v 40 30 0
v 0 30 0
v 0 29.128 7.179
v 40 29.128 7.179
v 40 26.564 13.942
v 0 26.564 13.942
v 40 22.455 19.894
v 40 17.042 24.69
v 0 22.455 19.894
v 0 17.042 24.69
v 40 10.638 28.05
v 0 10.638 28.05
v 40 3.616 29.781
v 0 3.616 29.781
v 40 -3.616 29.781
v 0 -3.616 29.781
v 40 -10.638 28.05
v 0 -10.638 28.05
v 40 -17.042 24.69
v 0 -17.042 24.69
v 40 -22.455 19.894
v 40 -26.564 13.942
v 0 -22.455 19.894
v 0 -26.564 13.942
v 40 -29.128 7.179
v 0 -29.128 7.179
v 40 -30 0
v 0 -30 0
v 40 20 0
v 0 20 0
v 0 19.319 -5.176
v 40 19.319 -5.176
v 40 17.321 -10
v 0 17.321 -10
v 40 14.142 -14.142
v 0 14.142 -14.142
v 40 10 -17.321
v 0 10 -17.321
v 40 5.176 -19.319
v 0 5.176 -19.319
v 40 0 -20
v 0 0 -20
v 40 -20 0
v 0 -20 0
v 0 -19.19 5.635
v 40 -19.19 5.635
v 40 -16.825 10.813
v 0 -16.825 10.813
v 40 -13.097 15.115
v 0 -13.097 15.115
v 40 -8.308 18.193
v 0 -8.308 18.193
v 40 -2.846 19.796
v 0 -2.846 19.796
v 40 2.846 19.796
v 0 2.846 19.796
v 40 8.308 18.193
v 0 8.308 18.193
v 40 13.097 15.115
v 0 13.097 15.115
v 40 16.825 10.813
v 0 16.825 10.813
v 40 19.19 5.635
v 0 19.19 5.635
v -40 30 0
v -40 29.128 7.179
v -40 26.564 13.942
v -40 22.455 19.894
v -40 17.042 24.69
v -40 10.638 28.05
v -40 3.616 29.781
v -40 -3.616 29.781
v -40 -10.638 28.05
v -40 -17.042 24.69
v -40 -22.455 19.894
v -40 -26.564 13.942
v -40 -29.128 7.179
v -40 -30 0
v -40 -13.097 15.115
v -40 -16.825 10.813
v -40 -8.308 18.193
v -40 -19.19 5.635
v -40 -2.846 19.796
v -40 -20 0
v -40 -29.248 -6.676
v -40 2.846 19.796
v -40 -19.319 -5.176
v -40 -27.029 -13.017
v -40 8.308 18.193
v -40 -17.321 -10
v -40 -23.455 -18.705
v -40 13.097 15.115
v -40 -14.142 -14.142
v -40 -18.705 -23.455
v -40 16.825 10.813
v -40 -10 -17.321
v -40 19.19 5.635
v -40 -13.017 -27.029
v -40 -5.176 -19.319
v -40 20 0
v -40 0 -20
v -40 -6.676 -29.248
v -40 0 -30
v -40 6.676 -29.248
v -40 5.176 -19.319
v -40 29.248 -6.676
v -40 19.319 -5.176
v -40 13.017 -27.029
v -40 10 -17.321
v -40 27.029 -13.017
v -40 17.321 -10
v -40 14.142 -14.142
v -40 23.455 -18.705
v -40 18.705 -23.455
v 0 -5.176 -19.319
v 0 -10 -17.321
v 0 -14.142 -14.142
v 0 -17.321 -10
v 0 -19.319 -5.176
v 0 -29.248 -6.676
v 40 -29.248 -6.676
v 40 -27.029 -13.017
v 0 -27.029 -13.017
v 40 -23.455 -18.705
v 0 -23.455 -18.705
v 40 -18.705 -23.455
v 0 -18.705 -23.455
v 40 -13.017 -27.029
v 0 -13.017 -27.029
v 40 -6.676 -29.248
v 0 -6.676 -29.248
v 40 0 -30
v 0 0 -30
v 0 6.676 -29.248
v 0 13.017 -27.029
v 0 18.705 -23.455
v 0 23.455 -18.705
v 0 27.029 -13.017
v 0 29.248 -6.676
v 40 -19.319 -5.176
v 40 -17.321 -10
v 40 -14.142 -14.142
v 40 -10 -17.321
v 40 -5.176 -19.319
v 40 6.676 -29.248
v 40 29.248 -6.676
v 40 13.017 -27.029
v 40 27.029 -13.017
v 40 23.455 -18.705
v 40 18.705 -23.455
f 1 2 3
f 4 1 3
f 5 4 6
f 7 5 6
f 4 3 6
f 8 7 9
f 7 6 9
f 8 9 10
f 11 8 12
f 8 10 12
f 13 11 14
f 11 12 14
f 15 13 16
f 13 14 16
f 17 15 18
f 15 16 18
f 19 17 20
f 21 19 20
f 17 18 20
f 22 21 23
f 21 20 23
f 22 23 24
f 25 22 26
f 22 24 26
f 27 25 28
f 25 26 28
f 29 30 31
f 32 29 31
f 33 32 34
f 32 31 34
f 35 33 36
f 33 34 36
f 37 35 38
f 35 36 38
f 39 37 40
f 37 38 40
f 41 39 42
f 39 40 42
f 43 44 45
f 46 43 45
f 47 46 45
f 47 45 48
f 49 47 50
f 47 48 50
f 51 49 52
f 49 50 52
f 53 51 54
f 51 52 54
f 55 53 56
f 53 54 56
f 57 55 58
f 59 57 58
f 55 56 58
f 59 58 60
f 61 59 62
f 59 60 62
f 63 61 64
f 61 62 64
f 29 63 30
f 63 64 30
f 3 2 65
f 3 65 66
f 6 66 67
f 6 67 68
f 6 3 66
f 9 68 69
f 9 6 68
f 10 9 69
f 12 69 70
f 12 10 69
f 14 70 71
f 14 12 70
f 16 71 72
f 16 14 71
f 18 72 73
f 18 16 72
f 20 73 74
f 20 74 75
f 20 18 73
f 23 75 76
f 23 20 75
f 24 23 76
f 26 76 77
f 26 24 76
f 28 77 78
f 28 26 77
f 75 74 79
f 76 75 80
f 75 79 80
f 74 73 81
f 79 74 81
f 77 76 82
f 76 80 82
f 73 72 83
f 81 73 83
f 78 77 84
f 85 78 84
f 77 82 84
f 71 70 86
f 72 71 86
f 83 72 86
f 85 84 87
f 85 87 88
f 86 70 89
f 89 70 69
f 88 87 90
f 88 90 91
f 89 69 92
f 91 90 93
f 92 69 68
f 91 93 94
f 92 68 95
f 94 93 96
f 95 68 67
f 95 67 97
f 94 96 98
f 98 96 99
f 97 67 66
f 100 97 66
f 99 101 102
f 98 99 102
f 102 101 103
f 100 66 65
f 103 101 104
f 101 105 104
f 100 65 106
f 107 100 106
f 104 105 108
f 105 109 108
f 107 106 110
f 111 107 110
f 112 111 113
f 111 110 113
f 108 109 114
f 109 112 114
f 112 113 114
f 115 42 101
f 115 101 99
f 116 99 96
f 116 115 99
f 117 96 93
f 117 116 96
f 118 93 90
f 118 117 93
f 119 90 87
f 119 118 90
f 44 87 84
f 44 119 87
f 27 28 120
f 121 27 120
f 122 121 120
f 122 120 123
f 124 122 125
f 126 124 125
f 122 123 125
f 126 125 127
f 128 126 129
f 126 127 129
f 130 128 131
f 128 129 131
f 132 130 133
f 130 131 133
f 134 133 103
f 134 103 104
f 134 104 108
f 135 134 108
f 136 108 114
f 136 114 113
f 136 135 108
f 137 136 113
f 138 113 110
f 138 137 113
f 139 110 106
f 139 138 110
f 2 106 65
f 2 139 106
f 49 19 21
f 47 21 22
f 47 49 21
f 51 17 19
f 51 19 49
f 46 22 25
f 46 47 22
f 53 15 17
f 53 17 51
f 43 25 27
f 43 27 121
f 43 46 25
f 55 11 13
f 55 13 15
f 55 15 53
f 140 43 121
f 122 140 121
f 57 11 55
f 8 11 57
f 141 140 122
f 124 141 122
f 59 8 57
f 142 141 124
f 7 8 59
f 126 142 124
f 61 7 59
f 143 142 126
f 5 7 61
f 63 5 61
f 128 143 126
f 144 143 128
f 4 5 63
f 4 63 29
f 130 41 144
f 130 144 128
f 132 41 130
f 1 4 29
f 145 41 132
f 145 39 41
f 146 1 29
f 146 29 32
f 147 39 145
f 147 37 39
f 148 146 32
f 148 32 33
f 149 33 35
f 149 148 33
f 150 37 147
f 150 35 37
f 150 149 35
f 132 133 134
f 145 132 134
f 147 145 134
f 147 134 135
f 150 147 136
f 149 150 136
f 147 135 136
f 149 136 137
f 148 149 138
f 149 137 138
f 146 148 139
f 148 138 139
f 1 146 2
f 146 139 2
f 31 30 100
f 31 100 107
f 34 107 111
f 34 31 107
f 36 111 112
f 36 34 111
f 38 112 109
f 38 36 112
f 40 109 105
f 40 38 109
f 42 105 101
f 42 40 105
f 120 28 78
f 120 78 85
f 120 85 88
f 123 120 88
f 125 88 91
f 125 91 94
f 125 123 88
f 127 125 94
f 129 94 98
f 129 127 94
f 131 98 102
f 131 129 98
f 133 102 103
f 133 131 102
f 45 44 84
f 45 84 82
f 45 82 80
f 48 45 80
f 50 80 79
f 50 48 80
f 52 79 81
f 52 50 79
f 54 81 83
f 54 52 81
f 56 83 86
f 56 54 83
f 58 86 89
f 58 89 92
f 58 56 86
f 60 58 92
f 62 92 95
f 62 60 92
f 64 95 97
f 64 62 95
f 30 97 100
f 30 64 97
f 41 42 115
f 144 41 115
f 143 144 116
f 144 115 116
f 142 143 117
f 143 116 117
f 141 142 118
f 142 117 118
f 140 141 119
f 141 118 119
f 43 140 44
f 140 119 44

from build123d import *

# Parameters (mm, degrees)
SKETCH1_R           = 30
SKETCH1_R_2         = 20
BOSS_EXTRUDE1_DEPTH = 40


with BuildPart() as part:
    # Sketch1 → Boss-Extrude1 (new, symmetric)
    with BuildSketch(Plane(origin=(0, 0, 0), x_dir=(0, 0, -1), z_dir=(1, 0, 0))):
        Circle(SKETCH1_R)
        Circle(SKETCH1_R_2, mode=Mode.SUBTRACT)
    extrude(amount=BOSS_EXTRUDE1_DEPTH, both=True)


solid = part.part
